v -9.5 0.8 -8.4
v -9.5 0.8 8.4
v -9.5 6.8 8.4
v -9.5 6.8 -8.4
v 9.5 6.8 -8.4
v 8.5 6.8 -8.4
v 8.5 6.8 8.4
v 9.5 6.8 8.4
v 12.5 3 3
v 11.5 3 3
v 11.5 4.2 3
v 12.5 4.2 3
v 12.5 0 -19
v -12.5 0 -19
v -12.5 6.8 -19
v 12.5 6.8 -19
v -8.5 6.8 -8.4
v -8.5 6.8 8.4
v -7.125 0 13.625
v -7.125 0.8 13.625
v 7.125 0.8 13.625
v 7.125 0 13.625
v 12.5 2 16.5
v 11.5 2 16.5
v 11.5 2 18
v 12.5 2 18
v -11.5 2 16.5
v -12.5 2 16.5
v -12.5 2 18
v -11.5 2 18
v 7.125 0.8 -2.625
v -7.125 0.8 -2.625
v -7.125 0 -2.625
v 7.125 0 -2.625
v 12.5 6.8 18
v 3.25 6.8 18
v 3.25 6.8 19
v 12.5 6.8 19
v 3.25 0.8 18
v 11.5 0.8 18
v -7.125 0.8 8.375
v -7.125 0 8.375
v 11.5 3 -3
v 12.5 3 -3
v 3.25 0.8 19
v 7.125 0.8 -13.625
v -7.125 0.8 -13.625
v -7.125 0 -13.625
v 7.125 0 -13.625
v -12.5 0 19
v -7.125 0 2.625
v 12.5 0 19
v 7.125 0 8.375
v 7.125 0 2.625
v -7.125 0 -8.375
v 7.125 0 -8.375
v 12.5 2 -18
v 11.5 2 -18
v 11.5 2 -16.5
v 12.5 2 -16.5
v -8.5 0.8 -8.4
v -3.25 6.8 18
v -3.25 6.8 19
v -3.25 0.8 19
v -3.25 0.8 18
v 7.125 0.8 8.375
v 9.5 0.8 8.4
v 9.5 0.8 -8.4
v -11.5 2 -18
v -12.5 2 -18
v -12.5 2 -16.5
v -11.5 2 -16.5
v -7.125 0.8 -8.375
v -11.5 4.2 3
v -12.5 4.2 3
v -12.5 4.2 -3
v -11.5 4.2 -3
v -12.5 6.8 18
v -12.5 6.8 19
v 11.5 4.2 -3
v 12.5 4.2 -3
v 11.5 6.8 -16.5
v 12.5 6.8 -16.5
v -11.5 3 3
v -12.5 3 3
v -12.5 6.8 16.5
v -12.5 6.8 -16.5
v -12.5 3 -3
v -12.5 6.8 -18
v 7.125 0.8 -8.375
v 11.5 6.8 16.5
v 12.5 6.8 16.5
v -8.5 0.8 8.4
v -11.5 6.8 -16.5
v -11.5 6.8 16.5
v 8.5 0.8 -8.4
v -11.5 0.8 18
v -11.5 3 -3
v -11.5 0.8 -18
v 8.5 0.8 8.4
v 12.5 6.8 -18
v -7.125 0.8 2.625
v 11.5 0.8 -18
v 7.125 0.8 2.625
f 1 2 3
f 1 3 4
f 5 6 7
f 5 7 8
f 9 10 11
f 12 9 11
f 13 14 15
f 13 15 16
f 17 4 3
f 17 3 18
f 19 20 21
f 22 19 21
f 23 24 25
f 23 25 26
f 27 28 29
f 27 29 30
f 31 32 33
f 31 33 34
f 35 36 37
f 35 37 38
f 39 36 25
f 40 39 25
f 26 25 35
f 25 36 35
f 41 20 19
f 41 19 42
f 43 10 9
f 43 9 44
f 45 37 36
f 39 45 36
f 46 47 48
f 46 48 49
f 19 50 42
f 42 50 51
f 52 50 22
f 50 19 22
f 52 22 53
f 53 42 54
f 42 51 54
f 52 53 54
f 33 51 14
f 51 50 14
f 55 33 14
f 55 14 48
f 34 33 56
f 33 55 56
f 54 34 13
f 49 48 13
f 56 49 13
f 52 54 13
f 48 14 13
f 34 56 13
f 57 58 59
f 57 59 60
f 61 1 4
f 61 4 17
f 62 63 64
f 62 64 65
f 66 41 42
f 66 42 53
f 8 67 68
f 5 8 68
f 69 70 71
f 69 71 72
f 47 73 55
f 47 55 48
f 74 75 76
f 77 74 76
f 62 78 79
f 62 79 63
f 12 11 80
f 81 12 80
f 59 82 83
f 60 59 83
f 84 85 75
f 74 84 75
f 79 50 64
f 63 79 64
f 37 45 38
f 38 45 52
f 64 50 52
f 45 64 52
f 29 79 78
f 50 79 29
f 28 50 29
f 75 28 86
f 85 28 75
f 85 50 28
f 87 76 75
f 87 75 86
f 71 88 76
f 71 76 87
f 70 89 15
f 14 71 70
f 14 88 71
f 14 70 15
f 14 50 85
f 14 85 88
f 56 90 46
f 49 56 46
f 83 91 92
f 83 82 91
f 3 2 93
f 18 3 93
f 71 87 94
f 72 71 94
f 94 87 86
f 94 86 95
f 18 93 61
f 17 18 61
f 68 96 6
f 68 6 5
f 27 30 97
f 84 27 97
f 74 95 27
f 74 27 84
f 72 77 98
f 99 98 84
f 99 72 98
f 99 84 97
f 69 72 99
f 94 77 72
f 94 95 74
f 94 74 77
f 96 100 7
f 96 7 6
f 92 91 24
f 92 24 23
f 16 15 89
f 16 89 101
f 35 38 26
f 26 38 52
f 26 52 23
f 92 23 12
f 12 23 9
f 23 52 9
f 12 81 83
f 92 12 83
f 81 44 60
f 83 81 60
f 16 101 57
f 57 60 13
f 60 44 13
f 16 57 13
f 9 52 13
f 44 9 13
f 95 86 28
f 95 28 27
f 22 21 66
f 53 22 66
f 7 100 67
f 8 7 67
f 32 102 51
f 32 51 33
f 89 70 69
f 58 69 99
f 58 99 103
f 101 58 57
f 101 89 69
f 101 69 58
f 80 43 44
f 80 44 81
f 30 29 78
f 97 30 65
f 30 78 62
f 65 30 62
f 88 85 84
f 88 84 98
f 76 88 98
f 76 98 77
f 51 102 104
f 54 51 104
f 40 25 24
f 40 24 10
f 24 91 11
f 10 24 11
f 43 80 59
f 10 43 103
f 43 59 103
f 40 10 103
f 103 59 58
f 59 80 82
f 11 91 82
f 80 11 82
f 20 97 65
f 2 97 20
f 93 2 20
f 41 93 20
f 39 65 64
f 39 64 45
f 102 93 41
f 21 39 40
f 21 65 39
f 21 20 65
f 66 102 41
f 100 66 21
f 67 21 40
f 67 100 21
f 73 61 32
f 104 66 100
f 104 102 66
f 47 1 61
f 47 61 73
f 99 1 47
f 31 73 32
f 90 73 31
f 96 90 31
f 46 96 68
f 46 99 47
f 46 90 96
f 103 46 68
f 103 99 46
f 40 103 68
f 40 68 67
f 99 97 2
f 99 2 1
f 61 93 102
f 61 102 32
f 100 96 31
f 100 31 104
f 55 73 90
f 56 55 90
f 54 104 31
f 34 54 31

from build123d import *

# Parameters (mm, degrees)
SKETCH1_W                      = 25
SKETCH1_H                      = 38
BOSS_EXTRUDE1_DEPTH            = 6.8
SKETCH2_W                      = 23
SKETCH2_H                      = 36
CUT_EXTRUDE1_DEPTH             = 6
SKETCH2_3_W                    = 1
SKETCH2_3_H                    = 1.5
CUT_EXTRUDE2_DEPTH             = 4.8
CUT_EXTRUDE3_DEPTH             = 24.737944309
CUT_EXTRUDE3_DEPTH_BACK        = 24.737944309
SKETCH3_W                      = 6
SKETCH3_H                      = 1.2
CUT_EXTRUDE4_REACH             = 25.521
SKETCH4_W                      = 14.25
SKETCH4_H                      = 5.25
CUT_EXTRUDE4_DIRECTION_2_DEPTH = 24.521266973
SKETCH5_W                      = 1
SKETCH5_H                      = 16.8
BOSS_EXTRUDE2_DEPTH            = 6
SKETCH6_W                      = 6.5
SKETCH6_H                      = 1
CUT_EXTRUDE5_DEPTH             = 6


with BuildPart() as part:
    # Sketch1 → Boss-Extrude1 (new body)
    with BuildSketch(Plane(origin=(0, 0, 0), x_dir=(1, 0, 0), z_dir=(0, 1, 0))):
        Rectangle(SKETCH1_W, SKETCH1_H)
    extrude(amount=BOSS_EXTRUDE1_DEPTH)

    # Sketch2 → Cut-Extrude1 (cut)
    with BuildSketch(Plane(origin=(0, 6.8, 0), x_dir=(1, 0, 0), z_dir=(0, 1, 0))):
        Rectangle(SKETCH2_W, SKETCH2_H)
    extrude(amount=-CUT_EXTRUDE1_DEPTH, mode=Mode.SUBTRACT)

    # Sketch2<3> → Cut-Extrude2 (cut)
    with BuildSketch(Plane(origin=(0, 6.8, 0), x_dir=(1, 0, 0), z_dir=(0, 1, 0))):
        with Locations((-12, 17.25)):
            Rectangle(SKETCH2_3_W, SKETCH2_3_H)
        with Locations((12, 17.25)):
            Rectangle(SKETCH2_3_W, SKETCH2_3_H)
        with Locations((-12, -17.25)):
            Rectangle(SKETCH2_3_W, SKETCH2_3_H)
        with Locations((12, -17.25)):
            Rectangle(SKETCH2_3_W, SKETCH2_3_H)
    extrude(amount=-CUT_EXTRUDE2_DEPTH, mode=Mode.SUBTRACT)

    # Sketch3 → Cut-Extrude3 (cut, two sides: drawn at the far end of the back side and taken through both)
    with BuildSketch(Plane(origin=(0, 0, 0), x_dir=(0, 0, -1), z_dir=(1, 0, 0)).offset(-CUT_EXTRUDE3_DEPTH_BACK)):
        with Locations((0, 3.6)):
            Rectangle(SKETCH3_W, SKETCH3_H)
    extrude(amount=CUT_EXTRUDE3_DEPTH + CUT_EXTRUDE3_DEPTH_BACK, mode=Mode.SUBTRACT)

    # Sketch4 → Cut-Extrude4 (cut, up to next)
    with BuildSketch(Plane(origin=(0, 0.8, 0), x_dir=(1, 0, 0), z_dir=(0, 1, 0)), mode=Mode.PRIVATE) as cut_extrude4_sk1:
        with Locations((0, -11)):
            Rectangle(SKETCH4_W, SKETCH4_H)
    cut_extrude4_tool1 = extrude(cut_extrude4_sk1.sketch, amount=-CUT_EXTRUDE4_REACH, mode=Mode.PRIVATE) & part.part
    # Sketch4 → Cut-Extrude4 (cut, up to next)
    with BuildSketch(Plane(origin=(0, 0.8, 0), x_dir=(1, 0, 0), z_dir=(0, 1, 0)), mode=Mode.PRIVATE) as cut_extrude4_sk2:
        Rectangle(SKETCH4_W, SKETCH4_H)
    cut_extrude4_tool2 = extrude(cut_extrude4_sk2.sketch, amount=-CUT_EXTRUDE4_REACH, mode=Mode.PRIVATE) & part.part
    # Sketch4 → Cut-Extrude4 (cut, up to next)
    with BuildSketch(Plane(origin=(0, 0.8, 0), x_dir=(1, 0, 0), z_dir=(0, 1, 0)), mode=Mode.PRIVATE) as cut_extrude4_sk3:
        with Locations((0, 11)):
            Rectangle(SKETCH4_W, SKETCH4_H)
    cut_extrude4_tool3 = extrude(cut_extrude4_sk3.sketch, amount=-CUT_EXTRUDE4_REACH, mode=Mode.PRIVATE) & part.part
    add(cut_extrude4_tool1.solids().sort_by_distance((0, 0.8, 11))[0], mode=Mode.SUBTRACT)
    add(cut_extrude4_tool2.solids().sort_by_distance((0, 0.8, 0))[0], mode=Mode.SUBTRACT)
    add(cut_extrude4_tool3.solids().sort_by_distance((0, 0.8, -11))[0], mode=Mode.SUBTRACT)

    # Sketch4 → Cut-Extrude4 direction 2 (cut)
    with BuildSketch(Plane(origin=(0, 0.8, 0), x_dir=(1, 0, 0), z_dir=(0, 1, 0))):
        with Locations((0, -11)):
            Rectangle(SKETCH4_W, SKETCH4_H)
        Rectangle(SKETCH4_W, SKETCH4_H)
        with Locations((0, 11)):
            Rectangle(SKETCH4_W, SKETCH4_H)
    extrude(amount=CUT_EXTRUDE4_DIRECTION_2_DEPTH, mode=Mode.SUBTRACT)

    # Sketch5 → Boss-Extrude2 (add)
    with BuildSketch(Plane(origin=(0, 0.8, 0), x_dir=(1, 0, 0), z_dir=(0, 1, 0))):
        with Locations((-9, 0)):
            Rectangle(SKETCH5_W, SKETCH5_H)
        with Locations((9, 0)):
            Rectangle(SKETCH5_W, SKETCH5_H)
    extrude(amount=BOSS_EXTRUDE2_DEPTH)

    # Sketch6 → Cut-Extrude5 (cut)
    with BuildSketch(Plane(origin=(0, 6.8, 0), x_dir=(1, 0, 0), z_dir=(0, 1, 0))):
        with Locations((0, -18.5)):
            Rectangle(SKETCH6_W, SKETCH6_H)
    extrude(amount=-CUT_EXTRUDE5_DEPTH, mode=Mode.SUBTRACT)


solid = part.part
